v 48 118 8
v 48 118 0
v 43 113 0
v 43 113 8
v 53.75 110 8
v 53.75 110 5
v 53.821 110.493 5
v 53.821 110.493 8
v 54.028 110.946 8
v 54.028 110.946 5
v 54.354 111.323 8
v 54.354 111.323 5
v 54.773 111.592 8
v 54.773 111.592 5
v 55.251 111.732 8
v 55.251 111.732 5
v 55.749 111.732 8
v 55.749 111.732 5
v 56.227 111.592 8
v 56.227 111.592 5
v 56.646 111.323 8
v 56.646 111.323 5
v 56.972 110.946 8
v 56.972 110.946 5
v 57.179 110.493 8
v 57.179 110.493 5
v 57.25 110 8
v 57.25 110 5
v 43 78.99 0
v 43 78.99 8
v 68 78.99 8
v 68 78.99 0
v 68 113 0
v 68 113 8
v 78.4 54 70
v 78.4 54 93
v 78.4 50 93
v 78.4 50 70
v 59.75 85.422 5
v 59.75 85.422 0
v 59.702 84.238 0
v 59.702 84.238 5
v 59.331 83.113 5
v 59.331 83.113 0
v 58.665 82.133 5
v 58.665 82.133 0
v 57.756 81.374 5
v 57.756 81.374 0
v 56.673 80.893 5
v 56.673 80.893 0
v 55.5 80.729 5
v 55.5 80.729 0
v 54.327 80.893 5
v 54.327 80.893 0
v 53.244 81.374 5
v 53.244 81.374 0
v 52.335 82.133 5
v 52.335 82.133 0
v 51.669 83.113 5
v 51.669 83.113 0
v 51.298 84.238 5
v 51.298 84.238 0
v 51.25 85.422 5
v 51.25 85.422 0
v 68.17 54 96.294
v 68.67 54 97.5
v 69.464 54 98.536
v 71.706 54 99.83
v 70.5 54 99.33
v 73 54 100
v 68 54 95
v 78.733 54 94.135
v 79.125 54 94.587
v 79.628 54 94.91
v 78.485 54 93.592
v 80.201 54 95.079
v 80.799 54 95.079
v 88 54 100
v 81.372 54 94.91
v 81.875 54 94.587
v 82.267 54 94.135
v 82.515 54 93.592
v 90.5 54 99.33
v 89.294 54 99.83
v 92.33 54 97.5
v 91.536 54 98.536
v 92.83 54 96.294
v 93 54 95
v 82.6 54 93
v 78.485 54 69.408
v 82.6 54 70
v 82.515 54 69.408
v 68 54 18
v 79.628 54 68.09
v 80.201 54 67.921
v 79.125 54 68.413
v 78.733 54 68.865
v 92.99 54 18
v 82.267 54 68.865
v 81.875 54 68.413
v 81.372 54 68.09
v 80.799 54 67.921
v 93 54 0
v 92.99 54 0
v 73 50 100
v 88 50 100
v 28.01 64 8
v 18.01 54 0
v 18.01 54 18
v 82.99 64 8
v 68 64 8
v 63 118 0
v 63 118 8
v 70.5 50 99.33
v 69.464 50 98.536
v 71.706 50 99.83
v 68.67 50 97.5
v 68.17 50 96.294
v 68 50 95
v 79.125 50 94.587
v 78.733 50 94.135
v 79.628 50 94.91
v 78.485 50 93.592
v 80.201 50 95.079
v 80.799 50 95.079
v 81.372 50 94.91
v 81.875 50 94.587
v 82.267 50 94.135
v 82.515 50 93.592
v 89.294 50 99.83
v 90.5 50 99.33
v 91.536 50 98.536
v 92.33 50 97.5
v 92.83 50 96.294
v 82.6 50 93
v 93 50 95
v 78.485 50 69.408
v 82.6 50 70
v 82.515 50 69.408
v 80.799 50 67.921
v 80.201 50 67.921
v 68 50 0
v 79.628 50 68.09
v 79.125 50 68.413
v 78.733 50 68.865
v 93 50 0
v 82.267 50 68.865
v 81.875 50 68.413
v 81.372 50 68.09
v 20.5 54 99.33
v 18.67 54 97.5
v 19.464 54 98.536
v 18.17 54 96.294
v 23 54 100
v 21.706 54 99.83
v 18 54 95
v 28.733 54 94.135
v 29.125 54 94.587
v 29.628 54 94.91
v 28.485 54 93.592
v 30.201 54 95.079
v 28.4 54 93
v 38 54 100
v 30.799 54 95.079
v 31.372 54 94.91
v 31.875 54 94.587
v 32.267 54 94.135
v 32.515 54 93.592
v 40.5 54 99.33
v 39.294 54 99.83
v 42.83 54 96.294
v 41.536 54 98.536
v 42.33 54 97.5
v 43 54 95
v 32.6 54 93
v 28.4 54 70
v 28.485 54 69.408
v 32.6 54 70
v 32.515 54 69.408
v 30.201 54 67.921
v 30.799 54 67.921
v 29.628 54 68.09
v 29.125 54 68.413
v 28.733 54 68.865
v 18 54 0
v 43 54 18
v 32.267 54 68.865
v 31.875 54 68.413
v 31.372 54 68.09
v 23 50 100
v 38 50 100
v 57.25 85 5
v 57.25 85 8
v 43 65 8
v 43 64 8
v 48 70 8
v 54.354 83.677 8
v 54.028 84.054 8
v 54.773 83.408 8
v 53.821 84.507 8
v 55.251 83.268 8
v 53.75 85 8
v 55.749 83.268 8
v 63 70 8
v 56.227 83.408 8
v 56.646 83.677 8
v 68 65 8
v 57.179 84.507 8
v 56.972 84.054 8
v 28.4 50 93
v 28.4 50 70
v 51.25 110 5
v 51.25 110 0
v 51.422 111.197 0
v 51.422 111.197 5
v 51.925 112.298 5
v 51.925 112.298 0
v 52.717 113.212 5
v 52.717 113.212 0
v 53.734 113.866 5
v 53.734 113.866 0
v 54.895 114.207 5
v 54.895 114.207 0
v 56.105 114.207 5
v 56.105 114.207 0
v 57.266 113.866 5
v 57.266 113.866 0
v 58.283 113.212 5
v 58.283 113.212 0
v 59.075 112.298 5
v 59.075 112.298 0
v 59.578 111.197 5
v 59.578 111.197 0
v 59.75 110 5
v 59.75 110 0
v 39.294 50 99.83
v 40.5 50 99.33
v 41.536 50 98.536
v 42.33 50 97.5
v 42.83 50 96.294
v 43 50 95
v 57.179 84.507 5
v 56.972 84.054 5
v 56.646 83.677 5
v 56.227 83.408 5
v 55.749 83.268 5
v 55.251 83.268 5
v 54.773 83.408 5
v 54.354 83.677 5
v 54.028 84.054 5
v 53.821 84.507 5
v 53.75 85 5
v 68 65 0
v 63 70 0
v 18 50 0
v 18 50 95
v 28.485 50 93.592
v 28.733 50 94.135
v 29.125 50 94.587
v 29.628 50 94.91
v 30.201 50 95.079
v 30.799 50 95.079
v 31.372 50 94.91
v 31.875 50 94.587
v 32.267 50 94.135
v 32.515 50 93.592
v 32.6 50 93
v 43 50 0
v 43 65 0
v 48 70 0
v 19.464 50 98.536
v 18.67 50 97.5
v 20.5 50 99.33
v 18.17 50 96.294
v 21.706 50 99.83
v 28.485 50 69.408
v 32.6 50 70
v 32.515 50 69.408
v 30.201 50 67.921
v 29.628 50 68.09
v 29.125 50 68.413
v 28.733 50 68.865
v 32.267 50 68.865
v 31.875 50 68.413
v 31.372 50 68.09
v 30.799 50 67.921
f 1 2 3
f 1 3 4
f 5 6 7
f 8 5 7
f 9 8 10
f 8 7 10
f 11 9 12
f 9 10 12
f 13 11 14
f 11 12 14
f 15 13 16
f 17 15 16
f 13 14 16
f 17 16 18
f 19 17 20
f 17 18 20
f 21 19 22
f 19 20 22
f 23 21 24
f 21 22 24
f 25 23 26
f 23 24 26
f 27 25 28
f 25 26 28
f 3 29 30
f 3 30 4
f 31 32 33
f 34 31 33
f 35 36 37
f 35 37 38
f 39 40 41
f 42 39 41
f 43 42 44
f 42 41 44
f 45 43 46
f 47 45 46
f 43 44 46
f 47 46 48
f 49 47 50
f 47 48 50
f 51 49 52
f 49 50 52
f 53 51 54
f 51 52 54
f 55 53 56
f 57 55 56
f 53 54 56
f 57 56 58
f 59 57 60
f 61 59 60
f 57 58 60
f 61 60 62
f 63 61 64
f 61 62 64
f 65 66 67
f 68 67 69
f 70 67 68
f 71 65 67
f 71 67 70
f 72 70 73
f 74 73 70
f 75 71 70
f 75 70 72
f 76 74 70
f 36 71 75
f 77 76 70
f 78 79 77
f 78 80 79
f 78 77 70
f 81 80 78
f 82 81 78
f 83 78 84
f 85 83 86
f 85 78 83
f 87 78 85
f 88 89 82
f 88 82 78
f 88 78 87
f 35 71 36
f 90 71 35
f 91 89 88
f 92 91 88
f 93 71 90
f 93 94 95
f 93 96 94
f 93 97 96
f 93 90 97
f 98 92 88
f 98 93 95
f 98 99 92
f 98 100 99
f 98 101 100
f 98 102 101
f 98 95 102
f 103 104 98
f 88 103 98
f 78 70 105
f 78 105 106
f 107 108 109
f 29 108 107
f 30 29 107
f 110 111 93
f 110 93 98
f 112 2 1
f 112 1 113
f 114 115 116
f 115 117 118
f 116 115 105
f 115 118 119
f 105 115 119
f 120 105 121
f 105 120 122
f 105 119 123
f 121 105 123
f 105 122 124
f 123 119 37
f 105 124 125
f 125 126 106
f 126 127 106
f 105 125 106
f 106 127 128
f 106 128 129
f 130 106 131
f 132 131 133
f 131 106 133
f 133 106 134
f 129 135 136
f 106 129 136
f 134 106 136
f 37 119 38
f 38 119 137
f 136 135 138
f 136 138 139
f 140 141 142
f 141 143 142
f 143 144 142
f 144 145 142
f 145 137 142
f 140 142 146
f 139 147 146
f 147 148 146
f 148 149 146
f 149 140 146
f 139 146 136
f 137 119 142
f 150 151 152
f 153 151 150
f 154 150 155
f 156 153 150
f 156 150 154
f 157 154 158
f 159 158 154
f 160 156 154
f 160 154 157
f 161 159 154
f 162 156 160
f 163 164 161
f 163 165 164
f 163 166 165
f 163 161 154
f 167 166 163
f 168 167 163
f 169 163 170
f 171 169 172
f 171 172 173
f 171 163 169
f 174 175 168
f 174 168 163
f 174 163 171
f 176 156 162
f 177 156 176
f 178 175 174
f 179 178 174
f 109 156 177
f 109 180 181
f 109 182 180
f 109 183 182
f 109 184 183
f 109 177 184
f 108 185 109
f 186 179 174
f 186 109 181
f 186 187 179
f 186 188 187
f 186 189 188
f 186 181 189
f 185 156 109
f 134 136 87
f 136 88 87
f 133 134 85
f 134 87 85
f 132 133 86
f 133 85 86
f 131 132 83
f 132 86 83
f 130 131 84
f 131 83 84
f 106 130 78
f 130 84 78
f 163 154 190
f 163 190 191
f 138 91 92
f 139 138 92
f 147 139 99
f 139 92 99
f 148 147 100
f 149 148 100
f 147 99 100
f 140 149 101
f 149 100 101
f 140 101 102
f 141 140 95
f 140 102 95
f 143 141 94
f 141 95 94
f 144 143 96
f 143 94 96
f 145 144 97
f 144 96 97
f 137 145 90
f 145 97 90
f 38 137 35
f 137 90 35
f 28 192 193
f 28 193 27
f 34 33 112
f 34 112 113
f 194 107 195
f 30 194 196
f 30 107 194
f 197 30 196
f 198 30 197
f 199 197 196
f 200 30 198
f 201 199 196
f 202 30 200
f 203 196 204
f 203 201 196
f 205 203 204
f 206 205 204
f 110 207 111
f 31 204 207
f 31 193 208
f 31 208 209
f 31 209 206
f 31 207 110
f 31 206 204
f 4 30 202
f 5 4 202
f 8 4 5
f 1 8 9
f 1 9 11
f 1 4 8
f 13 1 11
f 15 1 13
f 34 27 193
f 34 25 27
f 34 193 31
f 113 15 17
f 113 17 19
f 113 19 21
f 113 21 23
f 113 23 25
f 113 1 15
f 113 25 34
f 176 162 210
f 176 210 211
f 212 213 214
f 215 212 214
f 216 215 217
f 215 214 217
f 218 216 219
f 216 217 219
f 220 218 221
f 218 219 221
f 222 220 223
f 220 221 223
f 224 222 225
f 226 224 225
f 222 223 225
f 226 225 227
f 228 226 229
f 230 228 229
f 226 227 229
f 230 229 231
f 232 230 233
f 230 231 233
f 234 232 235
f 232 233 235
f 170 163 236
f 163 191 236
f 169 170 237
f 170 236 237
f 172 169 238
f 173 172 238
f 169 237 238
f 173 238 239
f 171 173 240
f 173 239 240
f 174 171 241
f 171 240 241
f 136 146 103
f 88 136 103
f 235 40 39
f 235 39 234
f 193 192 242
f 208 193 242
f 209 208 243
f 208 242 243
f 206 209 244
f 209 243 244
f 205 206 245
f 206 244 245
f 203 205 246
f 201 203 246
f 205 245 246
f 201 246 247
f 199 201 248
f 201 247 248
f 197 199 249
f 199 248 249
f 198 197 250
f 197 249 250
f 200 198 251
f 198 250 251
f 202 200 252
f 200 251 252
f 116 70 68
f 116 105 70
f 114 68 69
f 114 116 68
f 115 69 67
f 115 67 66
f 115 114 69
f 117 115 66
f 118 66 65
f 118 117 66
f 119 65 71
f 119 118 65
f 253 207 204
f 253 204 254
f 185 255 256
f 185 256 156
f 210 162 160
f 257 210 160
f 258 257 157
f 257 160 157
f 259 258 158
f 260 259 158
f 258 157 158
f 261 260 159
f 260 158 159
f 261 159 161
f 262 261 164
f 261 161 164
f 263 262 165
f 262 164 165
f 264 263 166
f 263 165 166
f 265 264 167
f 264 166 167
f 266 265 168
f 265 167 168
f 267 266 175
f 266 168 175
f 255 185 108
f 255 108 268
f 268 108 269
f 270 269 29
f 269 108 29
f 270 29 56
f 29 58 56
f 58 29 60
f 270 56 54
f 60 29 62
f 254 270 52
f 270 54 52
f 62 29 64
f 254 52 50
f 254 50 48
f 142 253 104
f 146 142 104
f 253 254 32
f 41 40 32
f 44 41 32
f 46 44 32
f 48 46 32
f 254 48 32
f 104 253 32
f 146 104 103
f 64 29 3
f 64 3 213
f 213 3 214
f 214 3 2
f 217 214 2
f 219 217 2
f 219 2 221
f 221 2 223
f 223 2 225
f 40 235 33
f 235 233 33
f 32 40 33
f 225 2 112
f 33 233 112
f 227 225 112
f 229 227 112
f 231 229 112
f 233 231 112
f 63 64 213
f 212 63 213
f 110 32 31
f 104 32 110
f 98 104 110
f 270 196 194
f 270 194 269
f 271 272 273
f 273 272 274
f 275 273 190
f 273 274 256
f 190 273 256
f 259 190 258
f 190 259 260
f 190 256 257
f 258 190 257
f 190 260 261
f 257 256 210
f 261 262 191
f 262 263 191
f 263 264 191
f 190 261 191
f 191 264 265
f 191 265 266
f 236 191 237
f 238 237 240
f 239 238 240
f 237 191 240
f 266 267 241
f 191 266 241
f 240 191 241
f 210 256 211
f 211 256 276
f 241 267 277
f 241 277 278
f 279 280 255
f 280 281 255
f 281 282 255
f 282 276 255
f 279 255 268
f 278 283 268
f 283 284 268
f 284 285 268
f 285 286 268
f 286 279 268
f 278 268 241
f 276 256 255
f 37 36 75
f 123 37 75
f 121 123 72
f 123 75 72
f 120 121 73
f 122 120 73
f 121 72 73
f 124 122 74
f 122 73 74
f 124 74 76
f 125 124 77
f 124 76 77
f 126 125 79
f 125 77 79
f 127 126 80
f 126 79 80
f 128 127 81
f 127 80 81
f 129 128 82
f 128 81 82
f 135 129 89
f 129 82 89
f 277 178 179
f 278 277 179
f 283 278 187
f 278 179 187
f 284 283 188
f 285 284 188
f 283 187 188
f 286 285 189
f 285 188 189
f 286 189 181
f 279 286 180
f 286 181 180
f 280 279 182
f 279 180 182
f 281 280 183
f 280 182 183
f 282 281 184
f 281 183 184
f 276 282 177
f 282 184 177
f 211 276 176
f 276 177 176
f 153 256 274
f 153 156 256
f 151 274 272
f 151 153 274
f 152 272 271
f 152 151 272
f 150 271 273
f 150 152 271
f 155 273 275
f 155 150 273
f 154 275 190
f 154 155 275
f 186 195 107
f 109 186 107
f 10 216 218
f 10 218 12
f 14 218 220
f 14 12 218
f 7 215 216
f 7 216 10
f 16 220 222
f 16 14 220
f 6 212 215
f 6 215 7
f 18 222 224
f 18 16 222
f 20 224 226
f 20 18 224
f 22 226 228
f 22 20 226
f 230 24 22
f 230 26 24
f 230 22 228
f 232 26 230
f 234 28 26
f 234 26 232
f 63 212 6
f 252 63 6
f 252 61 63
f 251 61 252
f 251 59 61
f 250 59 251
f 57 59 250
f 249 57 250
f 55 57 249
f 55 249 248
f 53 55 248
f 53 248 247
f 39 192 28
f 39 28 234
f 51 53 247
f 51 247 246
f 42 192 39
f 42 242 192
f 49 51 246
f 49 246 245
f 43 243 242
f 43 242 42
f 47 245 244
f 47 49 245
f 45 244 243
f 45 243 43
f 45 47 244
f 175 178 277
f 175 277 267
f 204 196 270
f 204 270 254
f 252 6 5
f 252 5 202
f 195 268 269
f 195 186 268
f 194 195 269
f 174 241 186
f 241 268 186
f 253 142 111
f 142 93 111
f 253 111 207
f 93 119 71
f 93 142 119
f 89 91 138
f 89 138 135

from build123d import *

# Parameters (mm, degrees)
BOX009_W        = 25
BOX009_H        = 20
BOX009_DEPTH    = 8
BOX005_W        = 25
BOX005_H        = 85
BOX005_DEPTH    = 8
BOX002_W        = 75
BOX002_H        = 4
BOX002_DEPTH    = 100
SKETCH001_W     = 25
SKETCH001_H     = 92
POCKET001_DEPTH = 5
FILLET_R        = 5
CHAMFER_SIZE    = 24.99
SKETCH002_W     = 25
SKETCH002_H     = 20
POCKET002_DEPTH = 10
CHAMFER001_SIZE = 5
CHAMFER002_SIZE = 10
POCKET003_DEPTH = 11
POCKET004_DEPTH = 4.5
CHAMFER004_SIZE = 5
BOX008_W        = 25
BOX008_H        = 35
BOX008_DEPTH    = 8
CHAMFER005_SIZE = 5
POCKET006_DEPTH = 8
POCKET007_DEPTH = 5


with BuildPart() as box009:
    # Box009 → Box009 (new body)
    with BuildSketch(Plane(origin=(43, 118, 0), x_dir=(1, 0, 0), z_dir=(0, 0, 1))):
        with Locations((12.5, 10)):
            Rectangle(BOX009_W, BOX009_H)
    extrude(amount=BOX009_DEPTH)


with BuildPart() as box005:
    # Box005 → Box005 (new body)
    with BuildSketch(Plane(origin=(43, 53, 0), x_dir=(1, 0, 0), z_dir=(0, 0, 1))):
        with Locations((12.5, 42.5)):
            Rectangle(BOX005_W, BOX005_H)
    extrude(amount=BOX005_DEPTH)


with BuildPart() as chamfer004:
    # Box002 → Box002 (new body)
    with BuildSketch(Plane(origin=(18, 50, 0), x_dir=(1, 0, 0), z_dir=(0, 0, 1))):
        with Locations((37.5, 2)):
            Rectangle(BOX002_W, BOX002_H)
    extrude(amount=BOX002_DEPTH)

    # Sketch001 → Pocket001 (cut)
    with BuildSketch(Plane(origin=(18, 54, 0), x_dir=(-1, 0, 0), z_dir=(0, 1, 0))):
        with BuildLine():
            Line((-60.4, 93), (-60.4, 70))
            ThreePointArc((-64.6, 70), (-62.5, 67.9), (-60.4, 70))
            Line((-64.6, 70), (-64.6, 93))
            ThreePointArc((-60.4, 93), (-62.5, 95.1), (-64.6, 93))
        make_face()
        with BuildLine():
            Line((-10.4, 93), (-10.4, 70))
            ThreePointArc((-14.6, 70), (-12.5, 67.9), (-10.4, 70))
            Line((-14.6, 70), (-14.6, 93))
            ThreePointArc((-10.4, 93), (-12.5, 95.1), (-14.6, 93))
        make_face()
        with Locations((-37.5, 54)):
            Rectangle(SKETCH001_W, SKETCH001_H)
    extrude(amount=-POCKET001_DEPTH, mode=Mode.SUBTRACT)

    # Fillet
    fillet_edges = [chamfer004.edges().sort_by_distance(p)[0] for p in [
        (93, 52, 100),
        (68, 52, 100),
        (43, 52, 100),
        (18, 52, 100),
    ]]
    fillet(fillet_edges, radius=FILLET_R)

    # Fusion: union Box005
    add(box005.part)

    # Chamfer
    chamfer_edges = [chamfer004.edges().sort_by_distance(p)[0] for p in [
        (43, 54, 4),
        (68, 54, 4),
    ]]
    chamfer(chamfer_edges, length=CHAMFER_SIZE)

    # Sketch002 → Pocket002 (cut)
    with BuildSketch(Plane.XY.offset(8)):
        with Locations((55.5, 60)):
            Rectangle(SKETCH002_W, SKETCH002_H)
    extrude(amount=-POCKET002_DEPTH, mode=Mode.SUBTRACT)

    # Chamfer001
    chamfer001_edges = [chamfer004.edges().sort_by_distance(p)[0] for p in [
        (43, 70, 4),
        (68, 70, 4),
    ]]
    chamfer(chamfer001_edges, length=CHAMFER001_SIZE)

    # Chamfer002
    chamfer002_edges = [chamfer004.edges().sort_by_distance(p)[0] for p in [
        (80.495, 54, 8),
        (30.505, 54, 8),
    ]]
    chamfer(chamfer002_edges, length=CHAMFER002_SIZE)

    # Sketch003 → Pocket003 (cut)
    with BuildSketch(Plane(origin=(0, 0, 0), x_dir=(1, 0, 0), z_dir=(0, 0, -1))):
        with BuildLine():
            Line((57.2, -132), (57.2, -107))
            ThreePointArc((57.2, -107), (55.5, -105.3), (53.8, -107))
            Line((53.8, -107), (53.8, -132))
            ThreePointArc((53.8, -132), (55.5, -133.7), (57.2, -132))
        make_face()
    extrude(amount=-POCKET003_DEPTH, mode=Mode.SUBTRACT)

    # Sketch004 → Pocket004 (cut)
    with BuildSketch(Plane(origin=(0, 0, 0), x_dir=(1, 0, 0), z_dir=(0, 0, -1))):
        with BuildLine():
            Line((51.75, -132), (51.75, -107))
            ThreePointArc((59.25, -107), (55.5, -103.25), (51.75, -107))
            Line((59.25, -107), (59.25, -132))
            ThreePointArc((51.75, -132), (55.5, -135.75), (59.25, -132))
        make_face()
    extrude(amount=-POCKET004_DEPTH, mode=Mode.SUBTRACT)

    # Chamfer004
    chamfer004_edges = [chamfer004.edges().sort_by_distance(p)[0] for p in [
        (43, 138, 4),
        (68, 138, 4),
    ]]
    chamfer(chamfer004_edges, length=CHAMFER004_SIZE)


with BuildPart() as pocket007:
    # Box008 → Box008 (new body)
    with BuildSketch(Plane(origin=(43, 103, 0), x_dir=(1, 0, 0), z_dir=(0, 0, 1))):
        with Locations((12.5, 17.5)):
            Rectangle(BOX008_W, BOX008_H)
    extrude(amount=BOX008_DEPTH)

    # Fusion001: union Chamfer004
    add(chamfer004.part)

    # Cut001: cut Box009
    add(box009.part, mode=Mode.SUBTRACT)

    # Chamfer005
    chamfer005_edges = [pocket007.edges().sort_by_distance(p)[0] for p in [
        (43, 118, 4),
        (68, 118, 4),
    ]]
    chamfer(chamfer005_edges, length=CHAMFER005_SIZE)

    # Sketch006 → Pocket006 (cut)
    with BuildSketch(Plane(origin=(0, 0, 0), x_dir=(1, 0, 0), z_dir=(0, 0, -1))):
        with BuildLine():
            Line((57.25, -85), (57.25, -110))
            ThreePointArc((53.75, -110), (55.5, -111.75), (57.25, -110))
            Line((53.75, -110), (53.75, -85))
            ThreePointArc((57.25, -85), (55.5, -83.25), (53.75, -85))
        make_face()
    extrude(amount=-POCKET006_DEPTH, mode=Mode.SUBTRACT)

    # Sketch007 → Pocket007 (cut)
    with BuildSketch(Plane(origin=(0, 0, 0), x_dir=(1, 0, 0), z_dir=(0, 0, -1))):
        with BuildLine():
            ThreePointArc((59.75, -85.421578), (55.5, -80.729142), (51.25, -85.421578))
            Line((51.25, -85.421578), (51.25, -110))
            ThreePointArc((51.25, -110), (55.5, -114.25), (59.75, -110))
            Line((59.75, -85.421578), (59.75, -110))
        make_face()
    extrude(amount=-POCKET007_DEPTH, mode=Mode.SUBTRACT)


solid = pocket007.part
